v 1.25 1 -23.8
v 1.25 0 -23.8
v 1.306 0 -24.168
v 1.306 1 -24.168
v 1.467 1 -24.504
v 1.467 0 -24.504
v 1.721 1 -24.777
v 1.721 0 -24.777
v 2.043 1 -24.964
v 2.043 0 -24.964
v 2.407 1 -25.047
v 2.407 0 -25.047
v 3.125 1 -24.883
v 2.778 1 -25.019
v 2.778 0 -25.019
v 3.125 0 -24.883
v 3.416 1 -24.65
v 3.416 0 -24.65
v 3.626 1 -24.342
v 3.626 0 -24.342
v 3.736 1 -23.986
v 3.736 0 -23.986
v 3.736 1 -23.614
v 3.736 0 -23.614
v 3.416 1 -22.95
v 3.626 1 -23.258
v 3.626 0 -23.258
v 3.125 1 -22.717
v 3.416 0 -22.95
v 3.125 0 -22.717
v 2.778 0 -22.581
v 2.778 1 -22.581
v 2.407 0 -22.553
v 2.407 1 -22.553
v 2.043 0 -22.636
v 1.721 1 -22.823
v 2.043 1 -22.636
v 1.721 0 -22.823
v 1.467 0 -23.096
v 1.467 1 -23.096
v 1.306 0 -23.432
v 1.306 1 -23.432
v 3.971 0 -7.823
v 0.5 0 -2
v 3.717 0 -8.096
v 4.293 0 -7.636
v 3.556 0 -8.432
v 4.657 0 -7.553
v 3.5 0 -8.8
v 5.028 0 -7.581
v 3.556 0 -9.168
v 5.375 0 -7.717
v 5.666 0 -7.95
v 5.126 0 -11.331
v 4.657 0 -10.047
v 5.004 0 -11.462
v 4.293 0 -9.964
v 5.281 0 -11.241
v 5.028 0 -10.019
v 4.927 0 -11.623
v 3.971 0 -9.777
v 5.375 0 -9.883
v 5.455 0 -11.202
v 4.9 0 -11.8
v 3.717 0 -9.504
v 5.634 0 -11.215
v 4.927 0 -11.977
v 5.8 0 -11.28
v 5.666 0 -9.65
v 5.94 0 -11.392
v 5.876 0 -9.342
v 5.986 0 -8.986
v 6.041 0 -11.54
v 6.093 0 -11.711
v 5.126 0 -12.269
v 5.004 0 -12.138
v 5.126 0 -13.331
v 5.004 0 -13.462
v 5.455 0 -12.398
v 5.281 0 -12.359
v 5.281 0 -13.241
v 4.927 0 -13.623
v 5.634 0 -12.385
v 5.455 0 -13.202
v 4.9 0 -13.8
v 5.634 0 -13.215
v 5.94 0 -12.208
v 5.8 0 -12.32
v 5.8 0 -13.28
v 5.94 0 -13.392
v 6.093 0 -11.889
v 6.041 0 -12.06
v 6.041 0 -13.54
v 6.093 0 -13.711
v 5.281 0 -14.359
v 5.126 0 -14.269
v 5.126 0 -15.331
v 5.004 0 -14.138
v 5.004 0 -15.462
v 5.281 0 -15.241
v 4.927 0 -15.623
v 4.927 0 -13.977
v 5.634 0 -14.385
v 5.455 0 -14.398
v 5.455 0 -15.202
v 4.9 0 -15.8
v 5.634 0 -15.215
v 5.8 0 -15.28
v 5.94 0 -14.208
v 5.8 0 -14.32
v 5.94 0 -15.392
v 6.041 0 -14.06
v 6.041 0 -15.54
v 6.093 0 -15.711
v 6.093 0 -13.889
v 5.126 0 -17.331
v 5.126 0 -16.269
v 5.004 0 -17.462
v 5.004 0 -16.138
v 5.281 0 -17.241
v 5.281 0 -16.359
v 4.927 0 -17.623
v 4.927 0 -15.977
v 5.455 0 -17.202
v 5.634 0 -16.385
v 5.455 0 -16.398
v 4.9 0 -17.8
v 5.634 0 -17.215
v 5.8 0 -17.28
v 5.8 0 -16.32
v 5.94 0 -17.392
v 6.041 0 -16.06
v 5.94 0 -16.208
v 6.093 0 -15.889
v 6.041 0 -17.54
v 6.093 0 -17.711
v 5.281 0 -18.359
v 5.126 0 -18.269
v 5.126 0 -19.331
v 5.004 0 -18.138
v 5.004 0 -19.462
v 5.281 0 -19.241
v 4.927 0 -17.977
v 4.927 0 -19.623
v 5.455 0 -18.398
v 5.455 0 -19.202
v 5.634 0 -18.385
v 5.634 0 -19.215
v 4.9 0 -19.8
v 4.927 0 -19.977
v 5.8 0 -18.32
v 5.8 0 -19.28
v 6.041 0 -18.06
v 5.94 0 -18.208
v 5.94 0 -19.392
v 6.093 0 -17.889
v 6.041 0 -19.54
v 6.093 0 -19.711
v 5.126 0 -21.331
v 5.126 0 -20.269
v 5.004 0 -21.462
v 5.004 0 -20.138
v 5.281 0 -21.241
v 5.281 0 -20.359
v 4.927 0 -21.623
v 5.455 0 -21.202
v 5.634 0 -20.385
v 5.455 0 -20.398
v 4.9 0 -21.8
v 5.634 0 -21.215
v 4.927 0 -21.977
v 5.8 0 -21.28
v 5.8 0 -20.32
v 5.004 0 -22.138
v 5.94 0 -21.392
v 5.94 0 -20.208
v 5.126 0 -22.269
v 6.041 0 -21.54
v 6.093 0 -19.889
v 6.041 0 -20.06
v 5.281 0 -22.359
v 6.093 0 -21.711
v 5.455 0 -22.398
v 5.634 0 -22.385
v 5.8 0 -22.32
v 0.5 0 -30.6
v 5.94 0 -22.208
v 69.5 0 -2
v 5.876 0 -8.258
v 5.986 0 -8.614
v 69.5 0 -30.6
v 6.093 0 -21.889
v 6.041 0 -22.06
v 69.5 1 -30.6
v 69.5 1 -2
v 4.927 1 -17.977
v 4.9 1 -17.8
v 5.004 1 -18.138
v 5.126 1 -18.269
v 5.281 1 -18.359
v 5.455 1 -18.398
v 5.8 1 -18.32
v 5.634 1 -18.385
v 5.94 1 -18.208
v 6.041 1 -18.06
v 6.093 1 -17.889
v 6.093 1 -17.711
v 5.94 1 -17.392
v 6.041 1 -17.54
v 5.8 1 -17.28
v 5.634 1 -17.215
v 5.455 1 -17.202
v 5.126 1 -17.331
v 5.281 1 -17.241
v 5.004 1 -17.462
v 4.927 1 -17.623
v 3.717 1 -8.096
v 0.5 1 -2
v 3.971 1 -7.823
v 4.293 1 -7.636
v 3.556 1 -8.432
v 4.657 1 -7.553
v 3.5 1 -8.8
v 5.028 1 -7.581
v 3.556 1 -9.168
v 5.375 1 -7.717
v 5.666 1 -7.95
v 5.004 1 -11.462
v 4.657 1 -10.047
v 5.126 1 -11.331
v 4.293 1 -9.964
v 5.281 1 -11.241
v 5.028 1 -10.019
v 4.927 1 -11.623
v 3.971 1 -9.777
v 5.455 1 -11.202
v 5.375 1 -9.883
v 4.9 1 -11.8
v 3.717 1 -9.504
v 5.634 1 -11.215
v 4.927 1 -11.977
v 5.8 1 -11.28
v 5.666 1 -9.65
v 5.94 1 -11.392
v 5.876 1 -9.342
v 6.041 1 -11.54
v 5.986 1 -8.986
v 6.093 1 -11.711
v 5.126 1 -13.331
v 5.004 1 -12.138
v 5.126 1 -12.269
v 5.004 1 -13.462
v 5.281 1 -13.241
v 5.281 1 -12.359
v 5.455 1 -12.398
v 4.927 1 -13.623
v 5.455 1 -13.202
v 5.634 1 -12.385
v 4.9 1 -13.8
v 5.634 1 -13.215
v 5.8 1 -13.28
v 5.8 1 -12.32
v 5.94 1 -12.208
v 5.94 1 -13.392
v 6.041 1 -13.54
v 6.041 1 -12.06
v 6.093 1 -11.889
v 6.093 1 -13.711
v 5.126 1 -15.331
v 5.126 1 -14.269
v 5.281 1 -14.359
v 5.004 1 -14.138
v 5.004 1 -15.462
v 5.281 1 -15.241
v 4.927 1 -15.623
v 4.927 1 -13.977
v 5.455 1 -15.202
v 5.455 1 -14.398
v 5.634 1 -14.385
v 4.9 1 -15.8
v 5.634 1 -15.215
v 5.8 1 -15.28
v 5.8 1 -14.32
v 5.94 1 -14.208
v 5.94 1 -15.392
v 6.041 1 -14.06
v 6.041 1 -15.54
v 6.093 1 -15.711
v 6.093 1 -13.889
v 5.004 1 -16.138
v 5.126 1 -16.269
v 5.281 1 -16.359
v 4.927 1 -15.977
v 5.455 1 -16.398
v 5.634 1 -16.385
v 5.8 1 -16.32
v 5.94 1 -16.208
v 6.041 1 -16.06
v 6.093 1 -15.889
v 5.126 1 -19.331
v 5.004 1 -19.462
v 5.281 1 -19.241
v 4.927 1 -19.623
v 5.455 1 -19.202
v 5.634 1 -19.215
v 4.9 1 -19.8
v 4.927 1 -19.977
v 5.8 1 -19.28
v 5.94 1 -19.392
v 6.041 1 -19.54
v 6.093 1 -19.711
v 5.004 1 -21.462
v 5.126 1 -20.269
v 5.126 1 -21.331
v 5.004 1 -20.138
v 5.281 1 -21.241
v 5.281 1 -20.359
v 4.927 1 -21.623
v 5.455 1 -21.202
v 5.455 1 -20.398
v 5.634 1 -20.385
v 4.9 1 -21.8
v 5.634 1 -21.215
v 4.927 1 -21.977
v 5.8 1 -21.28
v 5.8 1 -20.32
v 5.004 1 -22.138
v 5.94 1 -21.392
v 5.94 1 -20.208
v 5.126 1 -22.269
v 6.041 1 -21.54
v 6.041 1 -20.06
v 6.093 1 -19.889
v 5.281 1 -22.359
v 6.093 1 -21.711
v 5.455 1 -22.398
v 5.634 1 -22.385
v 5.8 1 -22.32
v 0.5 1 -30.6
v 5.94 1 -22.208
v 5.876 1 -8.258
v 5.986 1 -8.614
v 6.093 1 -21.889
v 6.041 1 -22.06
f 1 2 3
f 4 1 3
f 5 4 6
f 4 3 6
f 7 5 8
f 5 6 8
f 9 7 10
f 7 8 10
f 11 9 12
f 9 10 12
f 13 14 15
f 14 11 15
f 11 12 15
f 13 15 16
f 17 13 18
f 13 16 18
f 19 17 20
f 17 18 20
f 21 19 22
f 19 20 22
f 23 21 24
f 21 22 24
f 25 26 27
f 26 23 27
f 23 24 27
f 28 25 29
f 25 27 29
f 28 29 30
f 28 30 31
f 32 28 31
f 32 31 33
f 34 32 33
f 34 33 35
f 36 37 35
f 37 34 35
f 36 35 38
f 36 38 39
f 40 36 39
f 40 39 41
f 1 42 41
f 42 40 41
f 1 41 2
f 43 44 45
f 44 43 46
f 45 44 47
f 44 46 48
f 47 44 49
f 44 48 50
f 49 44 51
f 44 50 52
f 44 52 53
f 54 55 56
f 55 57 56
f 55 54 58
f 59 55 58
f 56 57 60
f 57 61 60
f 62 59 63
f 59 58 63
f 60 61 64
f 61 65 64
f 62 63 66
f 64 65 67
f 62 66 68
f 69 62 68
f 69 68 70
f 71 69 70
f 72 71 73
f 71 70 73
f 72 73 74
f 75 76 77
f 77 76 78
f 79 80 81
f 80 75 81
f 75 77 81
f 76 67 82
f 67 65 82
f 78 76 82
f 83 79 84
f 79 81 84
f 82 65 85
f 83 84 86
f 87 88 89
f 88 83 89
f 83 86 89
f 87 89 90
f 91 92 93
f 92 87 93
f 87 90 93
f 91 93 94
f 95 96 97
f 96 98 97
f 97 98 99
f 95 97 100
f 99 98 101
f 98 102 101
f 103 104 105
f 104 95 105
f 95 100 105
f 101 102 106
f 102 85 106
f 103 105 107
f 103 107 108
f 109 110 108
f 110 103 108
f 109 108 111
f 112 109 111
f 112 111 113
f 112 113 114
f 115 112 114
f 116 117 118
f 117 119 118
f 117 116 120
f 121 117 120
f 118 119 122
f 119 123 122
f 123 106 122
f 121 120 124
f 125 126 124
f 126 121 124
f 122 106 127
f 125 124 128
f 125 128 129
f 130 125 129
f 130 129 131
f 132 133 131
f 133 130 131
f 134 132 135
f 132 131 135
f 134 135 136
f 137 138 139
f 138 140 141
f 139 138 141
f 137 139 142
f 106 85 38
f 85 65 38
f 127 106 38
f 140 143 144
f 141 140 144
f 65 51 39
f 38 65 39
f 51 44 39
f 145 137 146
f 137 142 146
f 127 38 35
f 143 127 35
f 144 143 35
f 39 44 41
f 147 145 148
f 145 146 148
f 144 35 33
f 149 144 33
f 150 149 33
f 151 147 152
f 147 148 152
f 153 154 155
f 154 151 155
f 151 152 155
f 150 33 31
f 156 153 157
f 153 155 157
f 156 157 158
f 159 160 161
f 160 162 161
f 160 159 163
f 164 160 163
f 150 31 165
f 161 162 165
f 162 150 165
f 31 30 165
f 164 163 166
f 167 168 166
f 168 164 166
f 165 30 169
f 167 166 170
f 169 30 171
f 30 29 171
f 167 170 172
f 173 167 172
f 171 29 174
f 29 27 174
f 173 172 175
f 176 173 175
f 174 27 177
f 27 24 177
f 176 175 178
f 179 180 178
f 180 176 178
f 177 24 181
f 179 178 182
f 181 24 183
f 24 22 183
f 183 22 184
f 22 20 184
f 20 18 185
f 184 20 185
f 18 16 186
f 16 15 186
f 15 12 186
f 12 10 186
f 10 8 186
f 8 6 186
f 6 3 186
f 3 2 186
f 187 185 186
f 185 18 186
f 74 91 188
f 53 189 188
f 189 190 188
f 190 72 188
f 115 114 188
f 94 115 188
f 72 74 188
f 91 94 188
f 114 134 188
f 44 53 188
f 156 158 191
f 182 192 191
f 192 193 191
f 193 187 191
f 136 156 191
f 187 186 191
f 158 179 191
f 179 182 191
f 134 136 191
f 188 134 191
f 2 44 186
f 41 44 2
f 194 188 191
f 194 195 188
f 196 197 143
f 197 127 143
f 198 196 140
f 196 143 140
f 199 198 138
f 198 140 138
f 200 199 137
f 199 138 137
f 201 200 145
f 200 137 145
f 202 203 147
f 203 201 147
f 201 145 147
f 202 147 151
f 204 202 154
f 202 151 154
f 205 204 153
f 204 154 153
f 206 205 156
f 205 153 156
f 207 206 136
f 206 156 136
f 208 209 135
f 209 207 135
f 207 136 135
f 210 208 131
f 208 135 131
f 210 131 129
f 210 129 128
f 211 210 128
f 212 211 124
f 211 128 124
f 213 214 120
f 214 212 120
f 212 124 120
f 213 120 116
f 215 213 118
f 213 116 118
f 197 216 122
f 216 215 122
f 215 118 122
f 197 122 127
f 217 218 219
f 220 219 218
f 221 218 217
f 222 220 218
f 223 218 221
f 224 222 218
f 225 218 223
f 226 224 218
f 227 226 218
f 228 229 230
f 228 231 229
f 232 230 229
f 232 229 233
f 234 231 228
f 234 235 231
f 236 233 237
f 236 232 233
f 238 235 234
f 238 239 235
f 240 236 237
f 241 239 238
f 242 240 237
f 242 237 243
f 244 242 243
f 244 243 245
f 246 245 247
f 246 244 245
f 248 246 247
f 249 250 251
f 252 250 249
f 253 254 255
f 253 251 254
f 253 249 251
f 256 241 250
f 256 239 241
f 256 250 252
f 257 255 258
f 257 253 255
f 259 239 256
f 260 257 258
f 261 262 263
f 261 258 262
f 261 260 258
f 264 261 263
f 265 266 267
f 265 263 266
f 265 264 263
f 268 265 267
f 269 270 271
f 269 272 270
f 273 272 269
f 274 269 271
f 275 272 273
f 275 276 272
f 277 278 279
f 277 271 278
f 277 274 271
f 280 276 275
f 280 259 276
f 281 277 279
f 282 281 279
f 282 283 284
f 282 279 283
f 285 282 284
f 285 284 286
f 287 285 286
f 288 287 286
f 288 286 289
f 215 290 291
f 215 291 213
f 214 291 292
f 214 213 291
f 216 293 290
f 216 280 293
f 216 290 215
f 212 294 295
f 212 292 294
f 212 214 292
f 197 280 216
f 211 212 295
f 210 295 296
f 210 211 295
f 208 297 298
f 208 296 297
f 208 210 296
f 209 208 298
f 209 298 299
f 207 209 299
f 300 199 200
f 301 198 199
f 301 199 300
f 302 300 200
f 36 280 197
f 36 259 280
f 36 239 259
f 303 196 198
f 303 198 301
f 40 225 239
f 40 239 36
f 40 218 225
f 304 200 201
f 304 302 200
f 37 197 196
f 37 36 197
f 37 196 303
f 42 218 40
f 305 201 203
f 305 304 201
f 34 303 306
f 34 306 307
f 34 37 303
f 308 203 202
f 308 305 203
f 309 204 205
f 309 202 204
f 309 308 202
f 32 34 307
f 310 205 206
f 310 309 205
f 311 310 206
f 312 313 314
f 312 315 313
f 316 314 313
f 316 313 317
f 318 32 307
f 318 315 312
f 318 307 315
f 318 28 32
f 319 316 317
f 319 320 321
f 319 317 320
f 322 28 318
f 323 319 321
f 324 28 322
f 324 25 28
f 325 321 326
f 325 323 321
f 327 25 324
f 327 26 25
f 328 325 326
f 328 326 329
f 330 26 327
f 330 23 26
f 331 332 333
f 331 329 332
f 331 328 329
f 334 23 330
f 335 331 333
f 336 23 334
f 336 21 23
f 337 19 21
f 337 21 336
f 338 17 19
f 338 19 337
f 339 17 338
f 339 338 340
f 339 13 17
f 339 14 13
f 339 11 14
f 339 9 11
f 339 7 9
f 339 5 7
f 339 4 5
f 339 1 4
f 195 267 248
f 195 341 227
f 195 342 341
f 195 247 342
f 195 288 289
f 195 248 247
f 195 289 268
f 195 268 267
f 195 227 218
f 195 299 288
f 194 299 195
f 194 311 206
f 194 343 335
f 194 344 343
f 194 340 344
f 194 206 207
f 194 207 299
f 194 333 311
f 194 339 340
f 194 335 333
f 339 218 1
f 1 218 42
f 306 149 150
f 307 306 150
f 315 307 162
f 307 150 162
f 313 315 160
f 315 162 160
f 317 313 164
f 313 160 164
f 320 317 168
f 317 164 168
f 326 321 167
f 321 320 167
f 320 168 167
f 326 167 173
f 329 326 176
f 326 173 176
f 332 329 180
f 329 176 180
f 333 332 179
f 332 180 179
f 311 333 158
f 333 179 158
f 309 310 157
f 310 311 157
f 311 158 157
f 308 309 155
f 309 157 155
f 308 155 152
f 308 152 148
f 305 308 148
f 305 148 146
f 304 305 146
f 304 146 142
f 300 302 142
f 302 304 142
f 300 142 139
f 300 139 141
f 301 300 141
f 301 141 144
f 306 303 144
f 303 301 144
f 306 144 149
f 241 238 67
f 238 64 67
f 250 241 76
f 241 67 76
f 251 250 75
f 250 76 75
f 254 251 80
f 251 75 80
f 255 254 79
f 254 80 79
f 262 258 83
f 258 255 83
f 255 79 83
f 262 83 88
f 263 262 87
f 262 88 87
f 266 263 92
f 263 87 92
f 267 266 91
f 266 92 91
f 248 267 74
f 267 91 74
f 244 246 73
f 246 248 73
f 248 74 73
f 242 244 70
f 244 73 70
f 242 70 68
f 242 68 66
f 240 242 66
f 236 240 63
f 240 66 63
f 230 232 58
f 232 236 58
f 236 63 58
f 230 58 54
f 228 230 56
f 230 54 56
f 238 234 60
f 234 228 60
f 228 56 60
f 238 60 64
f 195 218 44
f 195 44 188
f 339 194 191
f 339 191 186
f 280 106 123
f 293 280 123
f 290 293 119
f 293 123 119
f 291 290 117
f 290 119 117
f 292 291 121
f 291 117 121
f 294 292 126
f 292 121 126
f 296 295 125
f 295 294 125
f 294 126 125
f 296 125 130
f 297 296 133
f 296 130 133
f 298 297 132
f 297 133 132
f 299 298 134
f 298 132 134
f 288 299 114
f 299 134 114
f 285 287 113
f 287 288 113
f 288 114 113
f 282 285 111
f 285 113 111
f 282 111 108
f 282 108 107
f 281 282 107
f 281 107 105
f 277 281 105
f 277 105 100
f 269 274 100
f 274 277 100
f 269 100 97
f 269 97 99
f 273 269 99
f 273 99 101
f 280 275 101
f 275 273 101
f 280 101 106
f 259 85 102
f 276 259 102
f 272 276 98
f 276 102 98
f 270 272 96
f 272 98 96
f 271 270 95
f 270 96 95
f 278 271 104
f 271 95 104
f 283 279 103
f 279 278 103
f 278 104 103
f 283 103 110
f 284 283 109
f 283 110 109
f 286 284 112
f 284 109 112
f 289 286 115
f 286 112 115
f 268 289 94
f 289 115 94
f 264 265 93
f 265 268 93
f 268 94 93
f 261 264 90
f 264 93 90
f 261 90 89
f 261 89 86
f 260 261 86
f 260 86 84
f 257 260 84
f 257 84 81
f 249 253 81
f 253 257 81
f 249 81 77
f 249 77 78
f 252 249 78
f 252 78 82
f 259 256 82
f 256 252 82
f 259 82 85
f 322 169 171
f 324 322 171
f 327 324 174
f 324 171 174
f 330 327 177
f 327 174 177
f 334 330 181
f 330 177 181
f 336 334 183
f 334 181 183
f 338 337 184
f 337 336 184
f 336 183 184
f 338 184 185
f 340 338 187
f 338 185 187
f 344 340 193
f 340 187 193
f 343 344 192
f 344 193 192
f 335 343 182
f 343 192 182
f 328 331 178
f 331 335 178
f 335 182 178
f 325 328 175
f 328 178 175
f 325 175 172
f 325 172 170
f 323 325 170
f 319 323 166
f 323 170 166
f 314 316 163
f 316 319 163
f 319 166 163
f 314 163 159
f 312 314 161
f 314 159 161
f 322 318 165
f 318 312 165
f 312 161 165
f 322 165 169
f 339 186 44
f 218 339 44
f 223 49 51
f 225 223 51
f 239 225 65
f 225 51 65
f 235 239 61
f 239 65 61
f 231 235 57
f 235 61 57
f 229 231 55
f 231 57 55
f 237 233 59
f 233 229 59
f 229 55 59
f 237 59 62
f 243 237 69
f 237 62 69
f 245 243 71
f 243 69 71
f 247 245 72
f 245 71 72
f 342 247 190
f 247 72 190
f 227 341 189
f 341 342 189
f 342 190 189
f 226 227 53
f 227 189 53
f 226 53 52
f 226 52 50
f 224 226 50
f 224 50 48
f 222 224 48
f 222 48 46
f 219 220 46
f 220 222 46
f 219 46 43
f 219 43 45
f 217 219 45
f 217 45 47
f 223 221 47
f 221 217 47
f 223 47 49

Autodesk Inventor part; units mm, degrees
ref_plane "YZ Plane" through (0, 0, 0) normal (1, 0, 0) x (0, 1, 0)
ref_plane "XZ Plane" through (0, 0, 0) normal (0, 1, 0) x (-1, 0, 0)
ref_plane "XY Plane" through (0, 0, 0) normal (0, 0, 1) x (1, 0, 0)
sketch "Эскиз1" plane through (0, 0, 0) normal (0, 1, 0) x (-1, 0, 0)
  line L0 (-5.5, -11.8) -> (-4.75, -11.8)
  circle A0 centre (-4.75, -8.8) radius 1.25
  circle A1 centre (-2.5, -23.8) radius 1.25
  circle A2 centre (-5.5, -19.8) radius 0.6
  circle A3 centre (-5.5, -21.8) radius 0.6
  circle A4 centre (-5.5, -17.8) radius 0.6
  circle A5 centre (-5.5, -15.8) radius 0.6
  circle A6 centre (-5.5, -13.8) radius 0.6
  circle A7 centre (-5.5, -11.8) radius 0.6
  line L1 (-0.5, -32.6) -> (-0.5, 0)
  line L2 (-0.5, -32.6) -> (-0.5, 0)
  line L3 (-0.5, 0) -> (-67.5, 0)
  line L4 (-67.5, 0) -> (-67.5, -32.6)
  line L5 (-67.5, -32.6) -> (-0.5, -32.6)
  line L6 (-0.5, -32.6) -> (-0.5, 0)
  dimension "d37" = 2.5
  dimension "d39" = 1.2
  dimension "d40" = 1.2
  dimension "d41" = 1.2
  dimension "d42" = 1.2
  dimension "d43" = 1.2
  dimension "d44" = 1.2
  dimension "d47" = 67
extrude "Выдавливание1" add sketch "Эскиз1" along normal blind 1
sketch "Эскиз2" plane through (0, 1, 0) normal (0, 1, 0) x (1, 0, 0)
  line L0 (0.5, 0) -> (67.5, 0) projected
  line L1 (0.5, 0) -> (0.5, 2)
  line L2 (0.5, 32.6) -> (0.5, 0) projected
  line L3 (0.5, 2) -> (67.5, 2)
  line L4 (67.5, 0) -> (67.5, 32.6) projected
  line L5 (0.5, 32.6) -> (0.5, 30.6)
  line L6 (0.5, 30.6) -> (67.5, 30.6)
  line L7 (67.5, 30.6) -> (68.5, 30.6)
  line L8 (68.5, 30.6) -> (68.5, 2)
  line L9 (68.5, 2) -> (67.5, 2)
  line L10 (67.5, 32.6) -> (0.5, 32.6) projected
  line L11 (0.5, 0) -> (67.5, 0)
  line L12 (67.5, 0) -> (67.5, 32.6)
  line L13 (67.5, 32.6) -> (0.5, 32.6)
  line L14 (0.5, 32.6) -> (0.5, 0)
  point P0 (0, 0)
  dimension "d48" = 2
  dimension "d49" = 2
  dimension "d50" = 1
extrude "Выдавливание2" cut sketch "Эскиз2" against normal blind 10 contours L1 L3 L4 L0 | L2 L10 L4 L6
sketch "Эскиз3" plane through (0, 1, 0) normal (0, 1, 0) x (1, 0, 0)
  line L0 (67.5, 2) -> (67.5, 30.6) projected
  line L1 (67.5, 2) -> (69.5, 2)
  line L2 (69.5, 2) -> (69.5, 30.6)
  line L3 (69.5, 30.6) -> (67.5, 30.6)
  line L4 (67.5, 30.6) -> (67.5, 2)
  point P0 (0, 0)
  dimension "d53" = 2
extrude "Выдавливание3" add sketch "Эскиз3" against normal blind 1
properties part number "akkum_board"
